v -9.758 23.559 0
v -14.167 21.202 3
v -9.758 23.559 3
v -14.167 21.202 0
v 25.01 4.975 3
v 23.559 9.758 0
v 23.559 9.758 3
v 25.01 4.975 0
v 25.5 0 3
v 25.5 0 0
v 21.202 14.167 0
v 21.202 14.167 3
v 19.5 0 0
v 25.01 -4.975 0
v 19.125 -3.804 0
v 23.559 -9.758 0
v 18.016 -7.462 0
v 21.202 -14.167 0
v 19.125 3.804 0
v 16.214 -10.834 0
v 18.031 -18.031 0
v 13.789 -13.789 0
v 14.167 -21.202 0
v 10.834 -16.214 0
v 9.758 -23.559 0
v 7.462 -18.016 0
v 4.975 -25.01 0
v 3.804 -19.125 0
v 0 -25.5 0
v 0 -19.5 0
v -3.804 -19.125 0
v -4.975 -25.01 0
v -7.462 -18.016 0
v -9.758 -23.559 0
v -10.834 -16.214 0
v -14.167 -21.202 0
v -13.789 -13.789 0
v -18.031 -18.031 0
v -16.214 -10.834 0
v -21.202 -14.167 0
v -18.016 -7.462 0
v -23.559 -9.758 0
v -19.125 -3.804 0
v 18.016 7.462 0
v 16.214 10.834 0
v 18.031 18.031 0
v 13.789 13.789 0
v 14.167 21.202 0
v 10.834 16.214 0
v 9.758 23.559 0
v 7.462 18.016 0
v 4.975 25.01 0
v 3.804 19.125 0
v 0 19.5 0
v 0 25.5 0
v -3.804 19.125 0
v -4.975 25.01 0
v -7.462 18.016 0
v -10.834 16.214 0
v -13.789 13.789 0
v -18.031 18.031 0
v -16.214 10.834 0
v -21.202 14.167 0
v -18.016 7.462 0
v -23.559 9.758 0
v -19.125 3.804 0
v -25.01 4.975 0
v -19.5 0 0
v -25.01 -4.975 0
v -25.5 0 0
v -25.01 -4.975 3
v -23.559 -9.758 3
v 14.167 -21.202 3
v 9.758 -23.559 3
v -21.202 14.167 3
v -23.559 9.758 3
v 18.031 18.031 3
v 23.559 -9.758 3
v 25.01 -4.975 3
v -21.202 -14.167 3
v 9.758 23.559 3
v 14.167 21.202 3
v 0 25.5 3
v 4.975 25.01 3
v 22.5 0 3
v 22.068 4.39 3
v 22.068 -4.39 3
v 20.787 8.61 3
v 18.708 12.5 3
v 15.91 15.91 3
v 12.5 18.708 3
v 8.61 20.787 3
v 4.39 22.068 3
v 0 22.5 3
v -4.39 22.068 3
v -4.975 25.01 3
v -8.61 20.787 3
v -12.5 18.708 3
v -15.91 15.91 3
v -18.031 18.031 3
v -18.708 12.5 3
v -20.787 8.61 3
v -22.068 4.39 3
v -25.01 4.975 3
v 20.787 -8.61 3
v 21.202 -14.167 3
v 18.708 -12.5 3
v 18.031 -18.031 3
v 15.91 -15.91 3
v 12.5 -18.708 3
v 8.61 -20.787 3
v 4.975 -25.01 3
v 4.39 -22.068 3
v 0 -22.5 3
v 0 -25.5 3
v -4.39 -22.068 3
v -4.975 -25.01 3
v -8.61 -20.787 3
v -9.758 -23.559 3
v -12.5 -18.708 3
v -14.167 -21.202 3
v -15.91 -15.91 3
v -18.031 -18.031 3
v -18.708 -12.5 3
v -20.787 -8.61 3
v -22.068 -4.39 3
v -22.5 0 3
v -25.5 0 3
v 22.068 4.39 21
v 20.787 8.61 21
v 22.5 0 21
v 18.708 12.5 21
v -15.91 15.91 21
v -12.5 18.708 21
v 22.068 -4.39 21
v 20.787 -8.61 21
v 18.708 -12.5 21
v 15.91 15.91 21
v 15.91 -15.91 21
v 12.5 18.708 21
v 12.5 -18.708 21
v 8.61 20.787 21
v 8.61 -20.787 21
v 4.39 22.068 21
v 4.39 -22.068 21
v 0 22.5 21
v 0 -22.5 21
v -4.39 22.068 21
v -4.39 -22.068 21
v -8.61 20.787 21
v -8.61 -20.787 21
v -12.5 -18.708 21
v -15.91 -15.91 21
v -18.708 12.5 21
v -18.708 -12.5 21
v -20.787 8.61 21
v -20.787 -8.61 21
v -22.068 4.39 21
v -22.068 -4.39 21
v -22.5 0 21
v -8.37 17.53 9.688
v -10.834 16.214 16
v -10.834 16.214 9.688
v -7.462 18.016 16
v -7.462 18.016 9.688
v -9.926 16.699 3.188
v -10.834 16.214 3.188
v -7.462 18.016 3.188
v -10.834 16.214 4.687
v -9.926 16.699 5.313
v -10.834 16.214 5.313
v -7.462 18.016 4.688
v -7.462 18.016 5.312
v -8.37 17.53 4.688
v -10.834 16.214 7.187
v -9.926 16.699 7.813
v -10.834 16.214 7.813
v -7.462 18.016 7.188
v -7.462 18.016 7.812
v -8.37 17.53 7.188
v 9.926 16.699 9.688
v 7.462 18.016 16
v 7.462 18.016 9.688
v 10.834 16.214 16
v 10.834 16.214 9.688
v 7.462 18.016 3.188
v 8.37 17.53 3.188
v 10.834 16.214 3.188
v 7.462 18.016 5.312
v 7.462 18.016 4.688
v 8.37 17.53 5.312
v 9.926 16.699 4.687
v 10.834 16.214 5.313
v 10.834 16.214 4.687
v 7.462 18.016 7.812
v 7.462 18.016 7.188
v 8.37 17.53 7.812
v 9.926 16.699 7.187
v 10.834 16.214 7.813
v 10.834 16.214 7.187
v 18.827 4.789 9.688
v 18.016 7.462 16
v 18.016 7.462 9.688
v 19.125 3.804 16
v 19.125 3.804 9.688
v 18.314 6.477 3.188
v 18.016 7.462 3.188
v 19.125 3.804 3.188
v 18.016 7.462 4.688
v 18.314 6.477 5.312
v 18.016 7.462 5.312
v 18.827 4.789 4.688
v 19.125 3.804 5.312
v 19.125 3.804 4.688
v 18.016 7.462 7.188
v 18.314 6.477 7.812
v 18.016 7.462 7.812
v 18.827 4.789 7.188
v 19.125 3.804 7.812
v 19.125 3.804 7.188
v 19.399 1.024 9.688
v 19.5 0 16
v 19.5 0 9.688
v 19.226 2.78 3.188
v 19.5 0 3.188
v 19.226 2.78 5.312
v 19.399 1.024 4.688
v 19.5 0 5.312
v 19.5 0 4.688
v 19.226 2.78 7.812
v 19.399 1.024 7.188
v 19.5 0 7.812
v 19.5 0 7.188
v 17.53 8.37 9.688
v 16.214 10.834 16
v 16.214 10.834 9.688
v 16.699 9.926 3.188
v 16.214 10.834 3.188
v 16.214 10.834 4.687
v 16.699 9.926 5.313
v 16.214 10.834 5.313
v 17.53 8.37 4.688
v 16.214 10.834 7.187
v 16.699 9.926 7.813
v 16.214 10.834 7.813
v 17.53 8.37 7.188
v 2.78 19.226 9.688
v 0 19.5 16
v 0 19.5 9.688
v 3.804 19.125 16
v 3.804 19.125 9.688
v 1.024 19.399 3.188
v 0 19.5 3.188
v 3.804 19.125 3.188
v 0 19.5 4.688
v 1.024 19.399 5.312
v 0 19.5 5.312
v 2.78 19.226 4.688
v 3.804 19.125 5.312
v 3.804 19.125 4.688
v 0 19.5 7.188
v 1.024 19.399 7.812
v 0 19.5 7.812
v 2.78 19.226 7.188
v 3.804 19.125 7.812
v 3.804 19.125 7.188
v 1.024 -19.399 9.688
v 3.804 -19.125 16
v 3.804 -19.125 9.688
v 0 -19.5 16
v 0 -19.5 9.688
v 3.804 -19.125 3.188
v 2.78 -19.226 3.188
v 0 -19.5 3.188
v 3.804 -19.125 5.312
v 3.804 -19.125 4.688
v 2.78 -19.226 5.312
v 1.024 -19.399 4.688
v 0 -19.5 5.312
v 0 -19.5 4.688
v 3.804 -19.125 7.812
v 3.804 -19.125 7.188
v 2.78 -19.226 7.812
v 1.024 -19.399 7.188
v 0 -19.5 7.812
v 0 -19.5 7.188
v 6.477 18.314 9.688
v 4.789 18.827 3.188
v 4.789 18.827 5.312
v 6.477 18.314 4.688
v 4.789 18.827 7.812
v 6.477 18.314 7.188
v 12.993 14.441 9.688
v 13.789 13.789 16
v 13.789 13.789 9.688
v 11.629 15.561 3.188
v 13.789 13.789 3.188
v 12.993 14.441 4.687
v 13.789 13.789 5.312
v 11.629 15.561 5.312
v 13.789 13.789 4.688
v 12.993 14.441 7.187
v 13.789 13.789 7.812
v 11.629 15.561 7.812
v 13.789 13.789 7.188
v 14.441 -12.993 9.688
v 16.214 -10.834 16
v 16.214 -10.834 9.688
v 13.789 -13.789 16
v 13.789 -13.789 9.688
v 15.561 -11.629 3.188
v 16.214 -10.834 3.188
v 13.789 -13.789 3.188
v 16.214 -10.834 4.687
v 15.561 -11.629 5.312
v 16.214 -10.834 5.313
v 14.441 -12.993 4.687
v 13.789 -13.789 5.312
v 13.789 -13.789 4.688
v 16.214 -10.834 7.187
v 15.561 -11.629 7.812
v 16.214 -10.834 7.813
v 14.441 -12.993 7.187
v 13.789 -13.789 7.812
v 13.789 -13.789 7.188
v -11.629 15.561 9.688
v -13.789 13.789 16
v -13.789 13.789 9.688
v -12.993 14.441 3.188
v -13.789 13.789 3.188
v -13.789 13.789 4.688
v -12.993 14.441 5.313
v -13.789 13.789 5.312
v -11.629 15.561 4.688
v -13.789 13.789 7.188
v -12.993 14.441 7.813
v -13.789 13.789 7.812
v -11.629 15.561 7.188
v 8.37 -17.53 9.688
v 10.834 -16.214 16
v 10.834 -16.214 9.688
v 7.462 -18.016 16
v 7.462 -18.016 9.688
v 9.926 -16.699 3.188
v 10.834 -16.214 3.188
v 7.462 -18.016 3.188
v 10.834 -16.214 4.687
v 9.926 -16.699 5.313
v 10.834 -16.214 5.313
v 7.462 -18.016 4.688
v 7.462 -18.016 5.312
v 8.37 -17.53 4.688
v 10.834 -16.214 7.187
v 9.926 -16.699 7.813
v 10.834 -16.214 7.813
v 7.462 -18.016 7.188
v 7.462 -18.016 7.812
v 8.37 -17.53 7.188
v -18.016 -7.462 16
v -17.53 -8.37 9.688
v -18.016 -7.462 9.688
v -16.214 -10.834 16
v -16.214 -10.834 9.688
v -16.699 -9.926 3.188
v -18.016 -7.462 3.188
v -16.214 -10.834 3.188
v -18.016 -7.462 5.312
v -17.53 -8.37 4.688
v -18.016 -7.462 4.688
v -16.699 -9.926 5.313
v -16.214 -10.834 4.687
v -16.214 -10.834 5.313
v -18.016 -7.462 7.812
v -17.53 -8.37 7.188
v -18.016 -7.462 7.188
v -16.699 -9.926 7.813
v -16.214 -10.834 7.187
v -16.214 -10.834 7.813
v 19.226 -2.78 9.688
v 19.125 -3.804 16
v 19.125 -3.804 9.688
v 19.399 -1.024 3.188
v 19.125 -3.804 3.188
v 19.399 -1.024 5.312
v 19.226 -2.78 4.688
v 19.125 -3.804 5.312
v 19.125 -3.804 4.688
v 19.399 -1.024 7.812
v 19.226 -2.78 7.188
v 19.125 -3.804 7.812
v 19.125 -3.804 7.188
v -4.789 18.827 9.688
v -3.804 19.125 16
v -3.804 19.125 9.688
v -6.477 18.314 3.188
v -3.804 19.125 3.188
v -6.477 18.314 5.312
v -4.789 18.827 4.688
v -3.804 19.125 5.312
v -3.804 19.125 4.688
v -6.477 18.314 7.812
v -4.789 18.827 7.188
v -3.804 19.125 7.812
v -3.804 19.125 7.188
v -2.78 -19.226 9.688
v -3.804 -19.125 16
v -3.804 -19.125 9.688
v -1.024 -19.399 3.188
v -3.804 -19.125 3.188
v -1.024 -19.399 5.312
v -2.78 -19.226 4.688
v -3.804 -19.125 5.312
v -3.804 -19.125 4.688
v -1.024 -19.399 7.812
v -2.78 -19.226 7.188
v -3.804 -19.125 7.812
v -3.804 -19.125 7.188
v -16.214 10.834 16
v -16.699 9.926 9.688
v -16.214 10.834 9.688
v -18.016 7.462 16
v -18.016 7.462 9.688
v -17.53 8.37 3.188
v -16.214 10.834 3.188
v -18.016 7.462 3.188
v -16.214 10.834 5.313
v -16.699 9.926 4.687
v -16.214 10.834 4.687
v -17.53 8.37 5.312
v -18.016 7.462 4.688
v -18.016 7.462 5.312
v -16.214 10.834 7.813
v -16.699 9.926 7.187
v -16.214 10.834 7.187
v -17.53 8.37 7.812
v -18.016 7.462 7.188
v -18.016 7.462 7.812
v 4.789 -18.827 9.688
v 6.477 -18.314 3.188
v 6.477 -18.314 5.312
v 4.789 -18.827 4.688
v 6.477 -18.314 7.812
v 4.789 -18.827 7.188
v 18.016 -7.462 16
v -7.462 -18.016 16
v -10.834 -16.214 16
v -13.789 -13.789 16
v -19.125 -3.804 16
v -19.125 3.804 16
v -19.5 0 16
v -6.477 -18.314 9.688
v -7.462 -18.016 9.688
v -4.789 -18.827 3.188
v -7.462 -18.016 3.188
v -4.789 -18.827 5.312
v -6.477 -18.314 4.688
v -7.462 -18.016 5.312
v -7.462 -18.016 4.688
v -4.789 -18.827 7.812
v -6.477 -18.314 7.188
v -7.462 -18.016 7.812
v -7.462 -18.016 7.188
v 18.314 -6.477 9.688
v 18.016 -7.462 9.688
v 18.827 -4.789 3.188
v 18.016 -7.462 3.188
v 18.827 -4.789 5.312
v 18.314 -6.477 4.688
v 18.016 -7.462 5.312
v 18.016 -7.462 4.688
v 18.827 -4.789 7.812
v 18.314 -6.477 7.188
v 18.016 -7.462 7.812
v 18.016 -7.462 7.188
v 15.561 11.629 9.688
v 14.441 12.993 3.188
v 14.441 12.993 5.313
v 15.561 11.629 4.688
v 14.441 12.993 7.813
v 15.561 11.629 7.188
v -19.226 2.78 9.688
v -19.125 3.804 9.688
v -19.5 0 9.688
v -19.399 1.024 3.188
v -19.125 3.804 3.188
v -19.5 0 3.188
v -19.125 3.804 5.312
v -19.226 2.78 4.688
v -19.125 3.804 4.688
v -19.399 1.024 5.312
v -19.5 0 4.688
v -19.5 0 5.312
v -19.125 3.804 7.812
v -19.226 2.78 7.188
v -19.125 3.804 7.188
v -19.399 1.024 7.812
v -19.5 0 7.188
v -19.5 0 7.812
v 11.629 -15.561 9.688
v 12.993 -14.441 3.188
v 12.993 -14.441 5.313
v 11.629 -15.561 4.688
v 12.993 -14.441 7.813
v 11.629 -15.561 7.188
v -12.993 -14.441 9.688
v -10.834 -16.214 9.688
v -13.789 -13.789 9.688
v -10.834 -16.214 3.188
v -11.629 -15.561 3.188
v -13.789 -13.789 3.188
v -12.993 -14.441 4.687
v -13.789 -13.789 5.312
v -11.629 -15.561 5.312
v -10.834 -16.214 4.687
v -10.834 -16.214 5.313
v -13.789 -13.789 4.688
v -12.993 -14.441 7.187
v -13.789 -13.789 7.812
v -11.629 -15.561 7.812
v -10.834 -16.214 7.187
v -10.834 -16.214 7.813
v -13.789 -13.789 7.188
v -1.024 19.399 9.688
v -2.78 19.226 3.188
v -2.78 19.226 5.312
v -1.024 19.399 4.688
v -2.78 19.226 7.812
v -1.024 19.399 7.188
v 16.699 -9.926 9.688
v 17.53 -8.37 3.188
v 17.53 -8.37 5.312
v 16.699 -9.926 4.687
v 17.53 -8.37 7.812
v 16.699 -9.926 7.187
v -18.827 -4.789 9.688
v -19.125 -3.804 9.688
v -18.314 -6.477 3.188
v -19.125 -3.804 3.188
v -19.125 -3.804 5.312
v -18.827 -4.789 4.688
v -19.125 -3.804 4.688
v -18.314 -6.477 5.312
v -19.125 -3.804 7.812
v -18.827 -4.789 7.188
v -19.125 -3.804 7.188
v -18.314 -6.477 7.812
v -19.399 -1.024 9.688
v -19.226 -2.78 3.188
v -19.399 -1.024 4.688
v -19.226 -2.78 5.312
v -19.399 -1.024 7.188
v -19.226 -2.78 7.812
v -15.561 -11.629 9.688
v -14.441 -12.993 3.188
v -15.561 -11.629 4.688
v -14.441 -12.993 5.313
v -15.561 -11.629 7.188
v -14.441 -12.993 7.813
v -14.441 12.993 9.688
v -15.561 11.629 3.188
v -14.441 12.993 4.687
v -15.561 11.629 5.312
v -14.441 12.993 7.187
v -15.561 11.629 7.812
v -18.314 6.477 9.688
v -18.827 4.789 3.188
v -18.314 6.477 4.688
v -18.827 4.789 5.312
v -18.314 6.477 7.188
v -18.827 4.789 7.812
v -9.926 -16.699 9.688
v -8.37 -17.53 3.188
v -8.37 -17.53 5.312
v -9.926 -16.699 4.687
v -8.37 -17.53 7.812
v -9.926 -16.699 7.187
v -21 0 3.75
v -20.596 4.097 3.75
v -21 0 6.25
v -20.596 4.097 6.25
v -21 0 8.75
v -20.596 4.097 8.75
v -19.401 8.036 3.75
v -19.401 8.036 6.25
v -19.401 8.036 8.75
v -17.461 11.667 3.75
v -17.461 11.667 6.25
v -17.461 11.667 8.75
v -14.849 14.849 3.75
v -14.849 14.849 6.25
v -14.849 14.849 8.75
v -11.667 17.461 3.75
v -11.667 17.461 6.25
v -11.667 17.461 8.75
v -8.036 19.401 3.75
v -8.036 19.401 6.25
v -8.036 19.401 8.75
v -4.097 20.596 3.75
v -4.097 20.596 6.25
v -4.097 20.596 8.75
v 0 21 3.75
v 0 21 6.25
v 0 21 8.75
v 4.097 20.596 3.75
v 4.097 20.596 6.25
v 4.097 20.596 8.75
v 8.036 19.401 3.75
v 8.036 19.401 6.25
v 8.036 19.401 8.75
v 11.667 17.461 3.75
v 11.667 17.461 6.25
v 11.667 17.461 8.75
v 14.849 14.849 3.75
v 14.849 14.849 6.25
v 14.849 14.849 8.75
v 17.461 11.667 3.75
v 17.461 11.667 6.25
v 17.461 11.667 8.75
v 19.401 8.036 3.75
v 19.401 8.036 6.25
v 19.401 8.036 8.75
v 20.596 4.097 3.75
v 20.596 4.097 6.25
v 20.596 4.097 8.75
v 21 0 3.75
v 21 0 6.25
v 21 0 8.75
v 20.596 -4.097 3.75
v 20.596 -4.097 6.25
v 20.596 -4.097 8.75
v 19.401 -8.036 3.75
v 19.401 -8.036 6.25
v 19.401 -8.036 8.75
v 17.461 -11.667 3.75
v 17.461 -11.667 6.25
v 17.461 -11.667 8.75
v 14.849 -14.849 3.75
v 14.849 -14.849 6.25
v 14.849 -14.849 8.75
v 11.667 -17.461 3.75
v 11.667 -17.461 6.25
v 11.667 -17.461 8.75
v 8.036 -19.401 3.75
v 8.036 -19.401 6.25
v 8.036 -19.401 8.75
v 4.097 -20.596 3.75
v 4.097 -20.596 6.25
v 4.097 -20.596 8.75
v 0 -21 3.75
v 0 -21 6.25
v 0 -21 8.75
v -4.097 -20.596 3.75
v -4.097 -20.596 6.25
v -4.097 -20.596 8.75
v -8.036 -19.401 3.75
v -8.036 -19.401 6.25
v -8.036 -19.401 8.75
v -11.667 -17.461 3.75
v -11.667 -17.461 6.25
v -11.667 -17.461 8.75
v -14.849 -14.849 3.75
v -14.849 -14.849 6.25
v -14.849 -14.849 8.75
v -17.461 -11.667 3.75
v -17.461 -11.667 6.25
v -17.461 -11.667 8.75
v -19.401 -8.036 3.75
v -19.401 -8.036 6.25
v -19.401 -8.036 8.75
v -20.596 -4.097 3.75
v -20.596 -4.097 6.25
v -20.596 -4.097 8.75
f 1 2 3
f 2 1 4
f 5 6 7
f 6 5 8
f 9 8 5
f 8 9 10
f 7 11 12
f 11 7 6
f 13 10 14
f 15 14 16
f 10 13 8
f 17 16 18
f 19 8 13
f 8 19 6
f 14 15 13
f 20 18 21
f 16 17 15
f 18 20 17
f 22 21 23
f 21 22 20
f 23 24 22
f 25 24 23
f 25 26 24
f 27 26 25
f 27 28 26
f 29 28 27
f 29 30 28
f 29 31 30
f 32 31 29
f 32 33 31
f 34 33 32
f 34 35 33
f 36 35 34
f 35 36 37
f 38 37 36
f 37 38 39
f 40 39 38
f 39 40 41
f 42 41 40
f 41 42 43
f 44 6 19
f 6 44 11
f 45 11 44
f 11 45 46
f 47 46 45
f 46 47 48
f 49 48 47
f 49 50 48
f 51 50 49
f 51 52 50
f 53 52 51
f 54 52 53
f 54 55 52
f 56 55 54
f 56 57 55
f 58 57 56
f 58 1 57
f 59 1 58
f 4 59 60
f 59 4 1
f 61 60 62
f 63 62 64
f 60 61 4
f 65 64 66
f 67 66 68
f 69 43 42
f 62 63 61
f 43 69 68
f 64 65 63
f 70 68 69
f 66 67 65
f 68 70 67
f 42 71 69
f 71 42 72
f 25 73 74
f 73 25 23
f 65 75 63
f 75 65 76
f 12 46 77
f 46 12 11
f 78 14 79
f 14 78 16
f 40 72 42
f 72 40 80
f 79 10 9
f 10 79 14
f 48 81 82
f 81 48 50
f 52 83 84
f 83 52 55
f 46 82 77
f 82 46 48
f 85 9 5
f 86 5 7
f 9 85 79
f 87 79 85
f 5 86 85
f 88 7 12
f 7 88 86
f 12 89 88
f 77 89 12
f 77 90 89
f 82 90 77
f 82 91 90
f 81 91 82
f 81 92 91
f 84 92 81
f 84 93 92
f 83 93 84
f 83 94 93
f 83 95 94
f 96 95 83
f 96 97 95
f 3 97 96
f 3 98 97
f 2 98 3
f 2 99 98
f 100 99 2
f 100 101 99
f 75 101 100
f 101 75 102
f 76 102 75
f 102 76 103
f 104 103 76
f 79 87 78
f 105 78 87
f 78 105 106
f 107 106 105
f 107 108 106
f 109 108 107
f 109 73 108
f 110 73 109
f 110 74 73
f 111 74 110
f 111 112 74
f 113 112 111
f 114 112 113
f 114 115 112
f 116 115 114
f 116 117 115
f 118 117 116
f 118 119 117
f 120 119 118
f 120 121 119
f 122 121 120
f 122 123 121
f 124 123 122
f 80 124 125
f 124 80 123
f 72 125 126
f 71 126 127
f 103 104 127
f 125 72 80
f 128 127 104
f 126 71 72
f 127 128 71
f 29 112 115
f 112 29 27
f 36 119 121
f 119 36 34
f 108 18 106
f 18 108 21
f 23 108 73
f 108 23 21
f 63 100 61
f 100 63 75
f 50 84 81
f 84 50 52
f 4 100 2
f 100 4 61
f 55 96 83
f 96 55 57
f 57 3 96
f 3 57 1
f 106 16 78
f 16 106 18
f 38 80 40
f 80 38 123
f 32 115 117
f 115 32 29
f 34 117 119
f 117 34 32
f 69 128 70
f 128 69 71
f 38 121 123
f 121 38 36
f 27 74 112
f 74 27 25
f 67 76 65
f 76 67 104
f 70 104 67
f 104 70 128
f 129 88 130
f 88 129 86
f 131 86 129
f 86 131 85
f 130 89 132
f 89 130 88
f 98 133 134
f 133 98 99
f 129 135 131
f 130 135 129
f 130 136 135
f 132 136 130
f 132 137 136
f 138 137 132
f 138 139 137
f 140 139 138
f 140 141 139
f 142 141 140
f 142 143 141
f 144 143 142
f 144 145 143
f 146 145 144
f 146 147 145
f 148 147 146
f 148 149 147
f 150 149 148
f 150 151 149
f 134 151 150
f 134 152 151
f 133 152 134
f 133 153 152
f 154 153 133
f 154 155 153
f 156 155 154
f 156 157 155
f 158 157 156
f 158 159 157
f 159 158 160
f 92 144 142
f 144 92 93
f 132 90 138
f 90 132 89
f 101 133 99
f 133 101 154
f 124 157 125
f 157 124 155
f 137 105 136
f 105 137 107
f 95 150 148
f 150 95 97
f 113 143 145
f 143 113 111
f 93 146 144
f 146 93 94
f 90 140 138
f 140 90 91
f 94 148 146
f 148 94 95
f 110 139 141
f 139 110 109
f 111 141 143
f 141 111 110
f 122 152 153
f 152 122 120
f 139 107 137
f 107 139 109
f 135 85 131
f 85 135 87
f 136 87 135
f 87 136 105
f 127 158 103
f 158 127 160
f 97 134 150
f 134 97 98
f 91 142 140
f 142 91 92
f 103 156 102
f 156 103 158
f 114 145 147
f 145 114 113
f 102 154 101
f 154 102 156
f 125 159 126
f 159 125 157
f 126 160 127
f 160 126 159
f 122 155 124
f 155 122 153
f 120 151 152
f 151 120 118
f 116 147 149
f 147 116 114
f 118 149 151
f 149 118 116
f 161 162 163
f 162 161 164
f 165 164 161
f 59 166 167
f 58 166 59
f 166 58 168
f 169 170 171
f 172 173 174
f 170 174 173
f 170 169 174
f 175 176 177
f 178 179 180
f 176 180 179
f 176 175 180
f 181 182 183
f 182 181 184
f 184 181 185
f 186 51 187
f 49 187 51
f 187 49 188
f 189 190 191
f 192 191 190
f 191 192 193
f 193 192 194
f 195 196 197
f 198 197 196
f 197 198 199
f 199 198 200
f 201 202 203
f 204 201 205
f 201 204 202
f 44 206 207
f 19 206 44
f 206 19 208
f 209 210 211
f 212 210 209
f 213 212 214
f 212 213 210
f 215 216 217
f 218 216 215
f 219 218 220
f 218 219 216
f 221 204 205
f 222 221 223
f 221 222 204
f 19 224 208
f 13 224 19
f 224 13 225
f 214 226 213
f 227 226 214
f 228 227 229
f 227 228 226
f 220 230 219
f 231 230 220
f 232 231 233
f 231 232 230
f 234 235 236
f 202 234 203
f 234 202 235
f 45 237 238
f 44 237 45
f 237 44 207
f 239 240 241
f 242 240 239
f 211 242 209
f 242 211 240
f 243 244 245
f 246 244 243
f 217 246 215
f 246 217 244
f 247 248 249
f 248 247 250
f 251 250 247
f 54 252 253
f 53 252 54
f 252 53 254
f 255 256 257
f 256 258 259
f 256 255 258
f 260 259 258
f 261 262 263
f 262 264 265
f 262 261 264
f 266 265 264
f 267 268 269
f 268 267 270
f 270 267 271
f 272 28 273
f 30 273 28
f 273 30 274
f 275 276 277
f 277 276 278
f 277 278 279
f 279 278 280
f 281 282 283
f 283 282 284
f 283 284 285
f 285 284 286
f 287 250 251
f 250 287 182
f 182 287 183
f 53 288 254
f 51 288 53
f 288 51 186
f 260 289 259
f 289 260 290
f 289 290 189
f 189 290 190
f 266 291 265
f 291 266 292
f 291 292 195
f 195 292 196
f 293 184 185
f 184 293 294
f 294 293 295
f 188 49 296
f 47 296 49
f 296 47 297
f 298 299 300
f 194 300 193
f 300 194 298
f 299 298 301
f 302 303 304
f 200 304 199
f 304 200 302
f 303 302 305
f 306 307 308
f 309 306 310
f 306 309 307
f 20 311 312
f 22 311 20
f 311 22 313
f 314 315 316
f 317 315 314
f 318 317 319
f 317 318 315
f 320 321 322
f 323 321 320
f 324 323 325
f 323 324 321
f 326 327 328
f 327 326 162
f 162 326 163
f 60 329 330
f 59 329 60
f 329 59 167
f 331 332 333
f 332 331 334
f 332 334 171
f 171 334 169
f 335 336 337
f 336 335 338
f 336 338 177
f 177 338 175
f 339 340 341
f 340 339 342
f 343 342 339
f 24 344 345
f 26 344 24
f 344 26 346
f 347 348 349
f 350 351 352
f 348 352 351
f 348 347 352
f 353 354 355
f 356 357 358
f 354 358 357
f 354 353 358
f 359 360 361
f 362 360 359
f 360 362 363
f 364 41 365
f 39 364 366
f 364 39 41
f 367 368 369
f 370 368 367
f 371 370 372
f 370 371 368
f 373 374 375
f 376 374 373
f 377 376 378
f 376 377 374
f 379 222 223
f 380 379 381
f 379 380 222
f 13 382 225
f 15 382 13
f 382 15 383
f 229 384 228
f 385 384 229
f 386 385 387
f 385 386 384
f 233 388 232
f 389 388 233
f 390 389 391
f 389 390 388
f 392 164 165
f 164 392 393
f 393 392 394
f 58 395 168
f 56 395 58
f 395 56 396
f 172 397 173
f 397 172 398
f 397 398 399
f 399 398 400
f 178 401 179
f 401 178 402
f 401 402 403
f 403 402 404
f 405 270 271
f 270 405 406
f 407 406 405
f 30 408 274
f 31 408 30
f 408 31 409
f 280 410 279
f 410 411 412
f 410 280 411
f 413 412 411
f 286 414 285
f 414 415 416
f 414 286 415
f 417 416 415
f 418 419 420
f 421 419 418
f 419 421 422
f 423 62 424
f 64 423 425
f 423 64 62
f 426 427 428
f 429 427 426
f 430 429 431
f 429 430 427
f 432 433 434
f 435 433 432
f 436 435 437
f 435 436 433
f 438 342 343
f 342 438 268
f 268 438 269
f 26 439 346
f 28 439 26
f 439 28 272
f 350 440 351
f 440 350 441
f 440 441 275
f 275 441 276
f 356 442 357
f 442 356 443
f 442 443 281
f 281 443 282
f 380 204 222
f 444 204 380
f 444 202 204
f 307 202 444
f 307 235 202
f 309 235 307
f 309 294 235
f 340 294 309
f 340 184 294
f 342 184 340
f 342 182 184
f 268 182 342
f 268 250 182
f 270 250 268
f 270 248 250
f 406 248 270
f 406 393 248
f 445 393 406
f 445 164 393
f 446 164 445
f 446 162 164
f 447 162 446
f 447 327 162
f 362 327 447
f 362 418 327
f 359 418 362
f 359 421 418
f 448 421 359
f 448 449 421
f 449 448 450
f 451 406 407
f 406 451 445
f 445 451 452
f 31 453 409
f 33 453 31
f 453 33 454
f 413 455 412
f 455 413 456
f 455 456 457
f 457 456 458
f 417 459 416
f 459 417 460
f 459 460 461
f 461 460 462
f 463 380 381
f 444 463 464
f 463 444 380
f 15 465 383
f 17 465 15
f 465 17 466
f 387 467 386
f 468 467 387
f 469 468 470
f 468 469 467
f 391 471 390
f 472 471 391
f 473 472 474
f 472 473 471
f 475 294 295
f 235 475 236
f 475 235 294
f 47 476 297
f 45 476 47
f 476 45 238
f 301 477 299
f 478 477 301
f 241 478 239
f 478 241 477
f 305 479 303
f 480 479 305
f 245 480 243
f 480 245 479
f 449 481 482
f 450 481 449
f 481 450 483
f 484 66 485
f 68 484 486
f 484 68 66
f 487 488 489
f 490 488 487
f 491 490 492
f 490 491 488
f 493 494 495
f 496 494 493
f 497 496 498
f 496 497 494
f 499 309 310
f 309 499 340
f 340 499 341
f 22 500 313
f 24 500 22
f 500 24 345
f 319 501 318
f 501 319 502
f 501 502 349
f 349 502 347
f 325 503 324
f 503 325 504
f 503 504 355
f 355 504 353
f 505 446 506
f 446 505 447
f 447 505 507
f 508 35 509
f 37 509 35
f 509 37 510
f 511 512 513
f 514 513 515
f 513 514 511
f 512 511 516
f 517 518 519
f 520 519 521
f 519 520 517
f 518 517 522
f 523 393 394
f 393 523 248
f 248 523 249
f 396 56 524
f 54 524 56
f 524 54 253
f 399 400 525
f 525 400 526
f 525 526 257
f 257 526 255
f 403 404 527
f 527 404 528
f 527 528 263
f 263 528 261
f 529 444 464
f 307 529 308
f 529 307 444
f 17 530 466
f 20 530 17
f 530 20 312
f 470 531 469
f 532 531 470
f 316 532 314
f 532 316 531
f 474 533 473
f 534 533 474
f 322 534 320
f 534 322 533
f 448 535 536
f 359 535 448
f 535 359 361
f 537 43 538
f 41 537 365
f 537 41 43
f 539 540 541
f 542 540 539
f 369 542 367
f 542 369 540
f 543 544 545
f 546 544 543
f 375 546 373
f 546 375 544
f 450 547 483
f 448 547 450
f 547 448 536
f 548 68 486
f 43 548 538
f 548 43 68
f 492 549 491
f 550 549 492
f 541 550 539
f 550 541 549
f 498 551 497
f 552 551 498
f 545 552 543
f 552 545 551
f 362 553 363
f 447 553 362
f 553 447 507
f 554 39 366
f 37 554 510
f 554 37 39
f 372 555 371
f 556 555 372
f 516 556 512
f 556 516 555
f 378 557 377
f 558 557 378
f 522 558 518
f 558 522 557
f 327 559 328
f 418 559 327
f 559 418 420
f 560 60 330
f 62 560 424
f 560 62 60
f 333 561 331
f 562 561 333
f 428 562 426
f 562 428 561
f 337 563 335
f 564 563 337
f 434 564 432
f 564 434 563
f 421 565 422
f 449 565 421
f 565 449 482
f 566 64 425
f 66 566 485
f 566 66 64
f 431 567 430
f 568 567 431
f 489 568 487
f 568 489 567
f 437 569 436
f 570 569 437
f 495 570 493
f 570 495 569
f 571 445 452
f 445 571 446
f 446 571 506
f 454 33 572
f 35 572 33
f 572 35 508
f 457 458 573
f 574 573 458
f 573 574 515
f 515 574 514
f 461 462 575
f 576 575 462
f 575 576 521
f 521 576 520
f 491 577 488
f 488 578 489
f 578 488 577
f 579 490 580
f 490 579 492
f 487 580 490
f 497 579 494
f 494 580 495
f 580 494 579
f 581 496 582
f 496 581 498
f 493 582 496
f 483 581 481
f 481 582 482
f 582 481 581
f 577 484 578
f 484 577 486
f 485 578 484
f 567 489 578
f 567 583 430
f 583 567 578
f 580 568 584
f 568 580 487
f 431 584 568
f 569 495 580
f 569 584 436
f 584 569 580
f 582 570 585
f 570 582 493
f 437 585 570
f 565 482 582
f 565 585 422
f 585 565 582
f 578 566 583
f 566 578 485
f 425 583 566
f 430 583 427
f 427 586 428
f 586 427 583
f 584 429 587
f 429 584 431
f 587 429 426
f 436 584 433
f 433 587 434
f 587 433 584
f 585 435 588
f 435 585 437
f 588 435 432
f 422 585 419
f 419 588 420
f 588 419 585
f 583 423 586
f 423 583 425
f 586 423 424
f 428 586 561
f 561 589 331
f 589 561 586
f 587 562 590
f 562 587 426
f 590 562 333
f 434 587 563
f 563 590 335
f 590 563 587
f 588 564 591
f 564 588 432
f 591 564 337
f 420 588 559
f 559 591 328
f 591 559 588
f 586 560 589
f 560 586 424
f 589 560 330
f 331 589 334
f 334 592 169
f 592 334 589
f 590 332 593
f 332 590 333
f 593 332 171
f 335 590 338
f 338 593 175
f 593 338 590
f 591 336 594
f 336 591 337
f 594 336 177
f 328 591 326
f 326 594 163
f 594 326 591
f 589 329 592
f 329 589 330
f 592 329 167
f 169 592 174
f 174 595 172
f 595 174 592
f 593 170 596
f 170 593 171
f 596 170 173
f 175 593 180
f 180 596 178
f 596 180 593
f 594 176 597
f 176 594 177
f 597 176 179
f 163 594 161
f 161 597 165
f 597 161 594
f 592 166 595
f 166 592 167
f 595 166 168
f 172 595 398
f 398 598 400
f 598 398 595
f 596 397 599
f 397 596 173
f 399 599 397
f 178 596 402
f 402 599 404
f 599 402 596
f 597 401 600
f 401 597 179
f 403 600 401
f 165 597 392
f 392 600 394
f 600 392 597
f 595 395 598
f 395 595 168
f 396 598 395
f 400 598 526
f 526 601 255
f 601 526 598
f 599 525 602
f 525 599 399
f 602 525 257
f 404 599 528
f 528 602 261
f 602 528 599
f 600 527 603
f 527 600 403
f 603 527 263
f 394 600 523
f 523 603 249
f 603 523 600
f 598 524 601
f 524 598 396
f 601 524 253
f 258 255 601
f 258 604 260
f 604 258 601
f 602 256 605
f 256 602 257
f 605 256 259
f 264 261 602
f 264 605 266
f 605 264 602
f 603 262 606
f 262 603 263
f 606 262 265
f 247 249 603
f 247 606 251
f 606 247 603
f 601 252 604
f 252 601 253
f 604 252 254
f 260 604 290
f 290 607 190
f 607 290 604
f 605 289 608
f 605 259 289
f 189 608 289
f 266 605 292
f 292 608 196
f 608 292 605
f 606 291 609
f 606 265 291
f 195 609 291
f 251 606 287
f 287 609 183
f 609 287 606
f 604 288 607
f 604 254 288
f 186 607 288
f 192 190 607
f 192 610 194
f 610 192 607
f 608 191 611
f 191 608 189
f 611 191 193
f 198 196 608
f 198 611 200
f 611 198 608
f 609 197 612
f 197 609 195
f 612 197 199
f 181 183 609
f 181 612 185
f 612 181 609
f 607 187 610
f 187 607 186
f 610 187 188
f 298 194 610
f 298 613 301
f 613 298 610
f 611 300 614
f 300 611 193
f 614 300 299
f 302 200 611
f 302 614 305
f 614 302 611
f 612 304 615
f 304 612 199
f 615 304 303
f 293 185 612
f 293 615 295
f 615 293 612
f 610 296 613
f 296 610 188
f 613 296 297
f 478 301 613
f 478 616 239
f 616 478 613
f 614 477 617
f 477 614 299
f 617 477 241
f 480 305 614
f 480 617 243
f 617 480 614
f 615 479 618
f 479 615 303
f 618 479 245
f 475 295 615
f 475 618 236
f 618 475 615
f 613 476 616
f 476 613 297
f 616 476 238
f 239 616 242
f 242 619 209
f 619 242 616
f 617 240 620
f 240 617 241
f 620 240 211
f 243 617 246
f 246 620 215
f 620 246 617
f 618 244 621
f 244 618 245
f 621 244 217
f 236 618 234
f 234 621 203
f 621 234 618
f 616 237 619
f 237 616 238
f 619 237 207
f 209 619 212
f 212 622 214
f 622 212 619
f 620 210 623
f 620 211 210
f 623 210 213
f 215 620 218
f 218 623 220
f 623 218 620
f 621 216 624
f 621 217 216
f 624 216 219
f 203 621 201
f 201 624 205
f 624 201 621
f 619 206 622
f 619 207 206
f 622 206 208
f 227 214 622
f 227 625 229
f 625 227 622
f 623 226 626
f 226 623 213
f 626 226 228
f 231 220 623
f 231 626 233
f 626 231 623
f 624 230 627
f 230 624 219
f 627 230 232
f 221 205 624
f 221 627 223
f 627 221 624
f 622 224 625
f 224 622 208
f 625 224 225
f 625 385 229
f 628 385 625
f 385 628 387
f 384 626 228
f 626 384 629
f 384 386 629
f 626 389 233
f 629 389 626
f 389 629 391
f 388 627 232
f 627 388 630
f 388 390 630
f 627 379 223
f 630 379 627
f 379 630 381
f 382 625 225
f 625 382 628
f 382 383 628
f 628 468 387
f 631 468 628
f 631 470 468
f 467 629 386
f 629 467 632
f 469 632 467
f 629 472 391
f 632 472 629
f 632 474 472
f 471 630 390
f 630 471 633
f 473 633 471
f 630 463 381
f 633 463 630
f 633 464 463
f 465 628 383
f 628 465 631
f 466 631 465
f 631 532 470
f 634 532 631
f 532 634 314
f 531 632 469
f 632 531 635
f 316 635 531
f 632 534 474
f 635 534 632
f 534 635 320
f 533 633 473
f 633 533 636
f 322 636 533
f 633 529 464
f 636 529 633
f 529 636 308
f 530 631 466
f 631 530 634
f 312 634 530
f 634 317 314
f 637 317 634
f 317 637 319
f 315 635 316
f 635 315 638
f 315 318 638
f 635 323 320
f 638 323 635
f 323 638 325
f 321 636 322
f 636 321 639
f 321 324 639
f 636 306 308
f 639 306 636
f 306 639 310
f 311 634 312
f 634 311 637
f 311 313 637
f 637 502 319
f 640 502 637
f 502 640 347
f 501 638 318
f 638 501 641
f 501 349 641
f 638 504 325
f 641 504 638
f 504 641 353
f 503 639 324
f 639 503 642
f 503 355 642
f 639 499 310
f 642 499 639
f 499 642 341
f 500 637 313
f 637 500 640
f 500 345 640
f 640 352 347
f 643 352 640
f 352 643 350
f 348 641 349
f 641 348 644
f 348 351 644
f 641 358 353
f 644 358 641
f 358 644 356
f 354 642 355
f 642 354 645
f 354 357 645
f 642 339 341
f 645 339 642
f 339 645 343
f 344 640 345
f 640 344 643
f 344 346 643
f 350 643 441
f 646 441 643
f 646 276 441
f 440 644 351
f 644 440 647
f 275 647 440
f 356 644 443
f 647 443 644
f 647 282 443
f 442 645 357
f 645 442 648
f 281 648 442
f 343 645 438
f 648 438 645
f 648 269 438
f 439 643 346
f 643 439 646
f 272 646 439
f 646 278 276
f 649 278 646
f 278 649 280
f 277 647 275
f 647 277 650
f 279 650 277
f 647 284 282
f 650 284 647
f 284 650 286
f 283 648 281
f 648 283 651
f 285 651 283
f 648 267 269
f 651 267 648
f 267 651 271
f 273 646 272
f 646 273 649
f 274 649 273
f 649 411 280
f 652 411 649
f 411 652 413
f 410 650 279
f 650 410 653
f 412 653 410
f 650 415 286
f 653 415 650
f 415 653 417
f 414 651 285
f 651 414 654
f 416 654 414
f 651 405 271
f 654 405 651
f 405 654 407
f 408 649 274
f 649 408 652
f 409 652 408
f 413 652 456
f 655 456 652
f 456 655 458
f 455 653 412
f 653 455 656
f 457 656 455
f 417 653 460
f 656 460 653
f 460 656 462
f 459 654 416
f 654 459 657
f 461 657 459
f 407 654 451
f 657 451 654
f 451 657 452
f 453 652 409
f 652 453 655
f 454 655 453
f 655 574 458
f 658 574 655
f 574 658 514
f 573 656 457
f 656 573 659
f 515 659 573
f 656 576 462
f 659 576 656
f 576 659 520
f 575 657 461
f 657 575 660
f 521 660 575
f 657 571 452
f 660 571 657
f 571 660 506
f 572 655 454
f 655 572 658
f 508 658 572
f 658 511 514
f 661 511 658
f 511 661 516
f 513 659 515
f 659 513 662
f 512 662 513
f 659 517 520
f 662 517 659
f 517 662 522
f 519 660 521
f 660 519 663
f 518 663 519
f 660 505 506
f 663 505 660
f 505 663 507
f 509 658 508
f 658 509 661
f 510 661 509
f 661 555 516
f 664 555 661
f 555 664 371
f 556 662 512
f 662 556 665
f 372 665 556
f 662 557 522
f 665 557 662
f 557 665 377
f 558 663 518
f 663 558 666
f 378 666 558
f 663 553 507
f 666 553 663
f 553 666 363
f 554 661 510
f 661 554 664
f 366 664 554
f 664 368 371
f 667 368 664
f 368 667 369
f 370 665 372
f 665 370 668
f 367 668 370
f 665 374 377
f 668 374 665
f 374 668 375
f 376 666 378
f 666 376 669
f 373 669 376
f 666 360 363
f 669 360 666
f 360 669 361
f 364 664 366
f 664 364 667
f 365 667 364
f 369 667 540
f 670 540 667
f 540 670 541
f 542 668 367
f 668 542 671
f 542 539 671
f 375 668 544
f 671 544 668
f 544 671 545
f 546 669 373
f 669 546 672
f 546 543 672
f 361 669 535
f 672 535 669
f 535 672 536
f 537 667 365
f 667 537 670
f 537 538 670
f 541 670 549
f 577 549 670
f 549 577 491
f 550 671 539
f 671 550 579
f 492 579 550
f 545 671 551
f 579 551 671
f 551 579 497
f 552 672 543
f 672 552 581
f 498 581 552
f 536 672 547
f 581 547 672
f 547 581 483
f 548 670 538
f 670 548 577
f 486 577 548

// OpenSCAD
$fn = 32;

// ----------------------------------------------------------------------
// Threaded cap: 45 mm body, 18 mm tall, 39 mm threaded bore
// ----------------------------------------------------------------------

// --- parameters (mm) ---
outer_d = 45;             // cap outside diameter
body_h = 18;              // cap height
top_t = 5;                // closed top thickness
bore_d = 39;              // bore core diameter
pitch = 2.5;              // thread pitch
thread_d = 1.5;           // thread depth
thread_z = 3;             // thread start above the rim
thread_h = 7;             // threaded height
flange_d = 51;            // flange diameter
flange_t = 3;             // flange thickness

difference() {
  union() {
    cylinder(h = 3, d = flange_d);
    translate([0, 0, 2.5]) cylinder(h = 18.5, d = outer_d);
  }
  /* threaded bore, closed at the top */
  translate([0, 0, -2.5]) cylinder(h = 18.5, d = bore_d);
  translate([0, 0, 3]) rotate_extrude() polygon([[18.5, 0], [18.5, 7], [19, 7], [21, 5.75], [19, 4.5], [21, 3.25], [19, 2], [21, 0.75], [19, 0], [18.5, 0]]);
}
